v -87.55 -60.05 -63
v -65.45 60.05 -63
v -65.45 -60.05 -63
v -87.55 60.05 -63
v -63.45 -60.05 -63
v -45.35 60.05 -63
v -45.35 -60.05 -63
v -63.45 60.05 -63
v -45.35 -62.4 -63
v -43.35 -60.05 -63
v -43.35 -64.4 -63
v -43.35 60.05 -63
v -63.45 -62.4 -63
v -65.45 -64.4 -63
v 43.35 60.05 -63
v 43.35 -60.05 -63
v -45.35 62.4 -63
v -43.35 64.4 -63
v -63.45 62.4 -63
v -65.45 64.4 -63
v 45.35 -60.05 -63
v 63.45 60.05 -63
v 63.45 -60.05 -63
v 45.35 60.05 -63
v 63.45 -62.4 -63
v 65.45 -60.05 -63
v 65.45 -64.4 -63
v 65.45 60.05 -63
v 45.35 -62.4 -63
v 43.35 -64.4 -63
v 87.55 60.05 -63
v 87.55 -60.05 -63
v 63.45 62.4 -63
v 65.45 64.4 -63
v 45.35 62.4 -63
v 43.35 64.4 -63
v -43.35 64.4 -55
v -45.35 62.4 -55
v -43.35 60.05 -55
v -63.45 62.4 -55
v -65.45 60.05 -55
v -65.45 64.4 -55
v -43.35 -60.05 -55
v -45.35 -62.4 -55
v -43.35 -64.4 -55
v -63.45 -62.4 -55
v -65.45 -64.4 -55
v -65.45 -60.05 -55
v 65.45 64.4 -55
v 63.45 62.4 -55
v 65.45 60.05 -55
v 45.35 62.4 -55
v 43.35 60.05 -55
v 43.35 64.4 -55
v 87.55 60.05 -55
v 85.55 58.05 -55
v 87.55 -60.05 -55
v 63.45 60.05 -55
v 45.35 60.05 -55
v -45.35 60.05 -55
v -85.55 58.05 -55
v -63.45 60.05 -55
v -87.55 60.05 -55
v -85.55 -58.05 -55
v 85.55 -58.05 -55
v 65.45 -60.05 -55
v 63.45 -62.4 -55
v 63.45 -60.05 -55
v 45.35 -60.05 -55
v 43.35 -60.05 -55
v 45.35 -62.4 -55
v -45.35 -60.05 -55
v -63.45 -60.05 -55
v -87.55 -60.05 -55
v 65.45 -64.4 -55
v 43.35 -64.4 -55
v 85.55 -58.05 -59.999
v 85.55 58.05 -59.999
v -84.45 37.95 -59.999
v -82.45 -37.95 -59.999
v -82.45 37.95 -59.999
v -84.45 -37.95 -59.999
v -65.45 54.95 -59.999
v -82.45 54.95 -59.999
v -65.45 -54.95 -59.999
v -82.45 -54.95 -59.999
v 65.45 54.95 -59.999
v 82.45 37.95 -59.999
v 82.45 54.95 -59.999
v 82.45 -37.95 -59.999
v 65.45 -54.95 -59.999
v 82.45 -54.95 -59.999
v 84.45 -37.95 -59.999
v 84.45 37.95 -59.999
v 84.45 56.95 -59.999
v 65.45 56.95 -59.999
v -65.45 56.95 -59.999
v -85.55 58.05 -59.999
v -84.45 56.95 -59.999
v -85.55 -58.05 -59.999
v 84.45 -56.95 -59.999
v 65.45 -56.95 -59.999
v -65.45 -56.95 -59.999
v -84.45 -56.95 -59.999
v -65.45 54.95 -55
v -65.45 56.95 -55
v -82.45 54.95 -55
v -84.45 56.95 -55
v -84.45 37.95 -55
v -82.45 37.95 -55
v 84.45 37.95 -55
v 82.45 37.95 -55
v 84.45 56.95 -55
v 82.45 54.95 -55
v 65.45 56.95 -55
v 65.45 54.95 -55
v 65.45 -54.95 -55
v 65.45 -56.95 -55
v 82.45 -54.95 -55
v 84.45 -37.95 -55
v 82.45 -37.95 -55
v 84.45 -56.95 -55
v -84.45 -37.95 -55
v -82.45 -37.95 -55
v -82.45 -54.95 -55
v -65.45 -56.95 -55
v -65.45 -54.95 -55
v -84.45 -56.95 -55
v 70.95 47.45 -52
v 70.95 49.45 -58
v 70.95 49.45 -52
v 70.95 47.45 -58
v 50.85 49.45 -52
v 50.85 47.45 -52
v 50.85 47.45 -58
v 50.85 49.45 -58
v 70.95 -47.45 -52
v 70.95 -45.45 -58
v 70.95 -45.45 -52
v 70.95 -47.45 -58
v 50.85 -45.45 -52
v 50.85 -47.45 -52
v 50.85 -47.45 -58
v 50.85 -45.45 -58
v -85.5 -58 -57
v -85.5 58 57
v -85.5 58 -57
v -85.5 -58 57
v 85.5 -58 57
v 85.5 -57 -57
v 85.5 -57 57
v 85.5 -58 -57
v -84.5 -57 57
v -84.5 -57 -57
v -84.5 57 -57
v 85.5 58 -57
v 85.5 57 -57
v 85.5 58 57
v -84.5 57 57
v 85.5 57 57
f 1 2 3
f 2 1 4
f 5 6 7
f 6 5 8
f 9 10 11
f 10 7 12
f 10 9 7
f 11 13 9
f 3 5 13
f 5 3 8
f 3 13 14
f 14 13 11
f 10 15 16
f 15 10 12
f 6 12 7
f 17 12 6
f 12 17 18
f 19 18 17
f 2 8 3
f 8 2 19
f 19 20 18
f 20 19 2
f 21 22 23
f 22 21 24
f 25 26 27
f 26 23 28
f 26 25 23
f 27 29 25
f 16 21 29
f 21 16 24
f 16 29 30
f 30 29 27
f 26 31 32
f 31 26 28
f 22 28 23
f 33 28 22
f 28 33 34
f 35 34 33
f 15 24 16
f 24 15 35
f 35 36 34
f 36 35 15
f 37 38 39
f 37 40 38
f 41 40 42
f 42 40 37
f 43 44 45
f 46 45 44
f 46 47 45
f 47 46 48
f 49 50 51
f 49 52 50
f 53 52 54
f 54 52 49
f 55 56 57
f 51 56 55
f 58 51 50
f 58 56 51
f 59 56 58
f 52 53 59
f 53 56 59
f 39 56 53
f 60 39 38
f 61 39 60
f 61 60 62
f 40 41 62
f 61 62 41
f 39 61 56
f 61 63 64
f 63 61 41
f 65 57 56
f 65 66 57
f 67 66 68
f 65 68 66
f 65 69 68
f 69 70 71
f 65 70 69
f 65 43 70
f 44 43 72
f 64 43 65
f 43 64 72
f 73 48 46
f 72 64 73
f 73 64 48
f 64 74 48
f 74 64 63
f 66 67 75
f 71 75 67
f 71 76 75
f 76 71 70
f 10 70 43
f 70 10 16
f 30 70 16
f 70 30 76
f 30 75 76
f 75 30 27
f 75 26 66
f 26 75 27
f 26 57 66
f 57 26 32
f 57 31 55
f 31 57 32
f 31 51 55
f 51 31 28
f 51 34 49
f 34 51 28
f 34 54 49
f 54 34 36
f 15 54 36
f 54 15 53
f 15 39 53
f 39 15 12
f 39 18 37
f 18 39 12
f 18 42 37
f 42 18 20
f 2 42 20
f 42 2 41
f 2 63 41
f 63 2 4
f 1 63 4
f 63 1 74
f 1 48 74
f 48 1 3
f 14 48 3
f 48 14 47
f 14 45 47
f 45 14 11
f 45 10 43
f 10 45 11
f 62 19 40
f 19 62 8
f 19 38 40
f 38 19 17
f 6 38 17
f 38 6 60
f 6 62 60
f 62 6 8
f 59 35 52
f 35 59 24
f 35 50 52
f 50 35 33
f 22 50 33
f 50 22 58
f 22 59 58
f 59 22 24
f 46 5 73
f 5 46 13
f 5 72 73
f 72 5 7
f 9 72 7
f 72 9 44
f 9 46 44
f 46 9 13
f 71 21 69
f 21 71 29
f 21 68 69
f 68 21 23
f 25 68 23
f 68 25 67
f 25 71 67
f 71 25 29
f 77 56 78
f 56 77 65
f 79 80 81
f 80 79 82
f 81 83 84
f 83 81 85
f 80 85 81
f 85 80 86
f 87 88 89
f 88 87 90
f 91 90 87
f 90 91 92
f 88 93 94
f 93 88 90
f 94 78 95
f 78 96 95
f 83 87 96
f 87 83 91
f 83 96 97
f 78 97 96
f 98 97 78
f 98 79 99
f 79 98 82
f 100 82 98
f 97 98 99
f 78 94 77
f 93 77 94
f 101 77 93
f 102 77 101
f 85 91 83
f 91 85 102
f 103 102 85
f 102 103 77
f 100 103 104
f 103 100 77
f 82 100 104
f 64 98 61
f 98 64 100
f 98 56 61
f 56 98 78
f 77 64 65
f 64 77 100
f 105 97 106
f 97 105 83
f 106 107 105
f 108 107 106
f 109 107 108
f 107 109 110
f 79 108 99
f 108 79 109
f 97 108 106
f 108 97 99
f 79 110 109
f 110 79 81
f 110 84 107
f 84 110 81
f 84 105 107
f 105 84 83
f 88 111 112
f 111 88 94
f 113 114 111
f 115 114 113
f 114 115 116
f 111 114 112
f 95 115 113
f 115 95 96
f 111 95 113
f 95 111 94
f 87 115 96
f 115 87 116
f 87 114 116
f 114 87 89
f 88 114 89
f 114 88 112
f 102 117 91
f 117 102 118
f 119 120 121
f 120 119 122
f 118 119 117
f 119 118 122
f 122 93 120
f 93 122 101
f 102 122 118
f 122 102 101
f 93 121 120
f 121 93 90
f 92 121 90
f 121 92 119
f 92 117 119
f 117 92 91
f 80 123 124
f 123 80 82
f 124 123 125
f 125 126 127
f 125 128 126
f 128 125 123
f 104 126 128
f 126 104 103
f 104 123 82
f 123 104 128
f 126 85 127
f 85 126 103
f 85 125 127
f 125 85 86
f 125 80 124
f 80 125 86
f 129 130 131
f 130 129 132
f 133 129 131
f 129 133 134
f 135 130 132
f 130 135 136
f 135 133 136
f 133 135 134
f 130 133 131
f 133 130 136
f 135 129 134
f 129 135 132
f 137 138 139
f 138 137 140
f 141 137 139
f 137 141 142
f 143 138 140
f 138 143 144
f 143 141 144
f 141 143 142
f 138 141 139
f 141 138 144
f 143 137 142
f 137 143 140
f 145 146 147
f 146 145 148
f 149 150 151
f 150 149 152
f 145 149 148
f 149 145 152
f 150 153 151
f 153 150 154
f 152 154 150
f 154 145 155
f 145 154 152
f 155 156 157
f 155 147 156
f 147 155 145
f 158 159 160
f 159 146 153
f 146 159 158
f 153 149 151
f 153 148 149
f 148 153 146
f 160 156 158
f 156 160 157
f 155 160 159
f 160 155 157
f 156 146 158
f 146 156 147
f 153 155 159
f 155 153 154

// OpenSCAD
// file: part_bottom.scad
// include <BOSL2/std.scad>

module part_bottom() {
    color("blue", 0.8)

        // 4. holders
        union() {}
            // 3. pocket
            difference() {
                linear_extrude(height=bottom_z, center=true)
                    union() {
                        // 1. create body
                        square([bottom_x, bottom_y], center=true);
                        // 2. add ears - module
                        union() {
                            translate([-ear_x_o, 0, 0]) bottom_ear();
                            translate([ear_x_o, 0, 0]) bottom_ear();
                        }
                    };
                translate([0, 0, bottom_t + 0.001]) cube(size=[bottom_x - bottom_t*2, bottom_y - bottom_t*2, bottom_po], center=true);
            }
            
            translate([-holder_x_o, holder_y_o, bottom_t / 2]) bottom_holder();
            translate([holder_x_o, holder_y_o, bottom_t / 2]) rotate([0, 0, -90]) bottom_holder();
            translate([holder_x_o, -holder_y_o, bottom_t / 2]) rotate([0, 0, 180]) bottom_holder();
            translate([-holder_x_o, -holder_y_o, bottom_t / 2]) rotate([0, 0, 90]) bottom_holder();

            translate([holder_x_o - ear_x - bottom_t, holder_y_o, bottom_t / 2]) cube([ear_x - bottom_t, bottom_t, bottom_po]);
            translate([holder_x_o - ear_x - bottom_t, -holder_y_o, bottom_t / 2]) cube([ear_x - bottom_t, bottom_t, bottom_po]);

                // front holder
                // 4 holders

                // bolts

                // lamp

}

module bottom_ear() {
    
    difference() {
        square(size=[ear_x, ear_y], center=true);
        square(size=[ear_x - bottom_t * 2, ear_y - bottom_t * 2], center=true);    
    }

}

module bottom_holder() {
    
    translate ([0, 0, 0]) difference() {
        cube(size=[holder_x, holder_x, bottom_po], center=true);
        translate([bottom_t, -bottom_t, 0]) cube(size=[holder_x, holder_x, bottom_po], center=true);
    }

}


module bottom_lamp() {
    // dif bolt 1
    // add bolt 2
    // dif lamp 1
    // dif lamp 2

}
// file: part_wall.scad
module part_left(args) {
    color("red", 0.2)
        rotate([90, 0, 0]) 
            cube([wall_x, wall_z, wall_t], center=true);
}

module part_right(args) {
    color("red", 0.2) 
        rotate([90, 0, 0]) 
            cube([wall_x, wall_z, wall_t], center=true);
}

module part_back(args) {
    color("red", 0.2) 
        rotate([0, 90, 0]) 
            cube([back_y_f, wall_z, wall_t], center=true);
}
// main file
include <part_wall.scad>
include <part_bottom.scad>
// include <part_top.scad>
// include <part_front.scad>
// include <part_parts.scad>

// x - width, f - fix
// z - height
// t - thickness
// tol - tolerance
// d - diameter
// y - deep
// o - offset
// po - pocket
// r - radius

tol_f = 0.05;

back_y_f = 114; 
wall_x = back_y_f / 114 * 171;
wall_z = back_y_f;
wall_t = back_y_f / 114 * 1;
back_x_o = (wall_x - wall_t) / 2 ;
left_y_o = (back_y_f - - wall_t) / 2;

leg_x = back_y_f / 114 * 18;
leg_t = leg_x / 8;

bottom_t = back_y_f / 114 * 2;
bottom_z = back_y_f / 114 * 8;
bottom_x = wall_x + tol_f * 2 + bottom_t * 2;
bottom_y = back_y_f + (bottom_t + wall_t + tol_f) * 2;
bottom_po = bottom_z - bottom_t;
bottom_z_o = wall_z / 2 + bottom_t;

ear_leg_po_y = leg_t + tol_f * 2;
ear_x = leg_x + tol_f * 2 + bottom_t * 2;
ear_x_o = bottom_x / 2 - ear_x - ear_x / 2;
ear_y = (ear_leg_po_y + bottom_t) * 2 + bottom_y;

wall_holder_o = wall_t + tol_f * 2;
holder_x = ear_x - bottom_t - wall_holder_o;
holder_x_o = bottom_x / 2 - holder_x / 2 - bottom_t - wall_holder_o;
holder_y_o = bottom_y / 2 - holder_x / 2 - bottom_t - wall_holder_o;

// leg_z = back_y_f / 114 * 180;
// leg_part_z = wall_z + bottom_t * 3;

// top_z = bottom_z - bottom_t;

// lamp_d_f = 76;
// lamp_d2_f =	85;
// lamp_arc_y_f = 24;
// lamp_door_o	= wall_x / 2;
// lamp_bolt_o_f = 2.5;
// lamp_bolt_o2_f = 62;
// lamp_bolt_d_f = 2;
// lamp_bolt_d2_f = 5.5;
// lamp_bolt_z_f = 1.5;


// tube_d = back_y_f / 114 * 40;
// tube_t = bottom_t / 2;
// tube_back_o	= back_y_f / 114 * 40;
// tube_z = back_y_f / 114 * 150;
// tube_x_o = bottom_x / 2 - tube_back_o;
// tube_z_o = bottom_z_o - bottom_t - tube_t;
// tube_internal_d = tube_d - tube_t * 2;
// tube_external_d = tube_internal_d + tube_d / 5;

// front_holes_f = 9;
// front_t = bottom_t / 2;
// front_hole_d = back_y_f / 114 * 8;
// front_hole_segment_y = back_y_f / front_holes_f;
// front_hole_z_o = back_y_f / 114 * 12;

// door_y_o = back_y_f / 114 * 15;
// door_z_o = back_y_f / 114 * 15;
// door_o = back_y_f / 114 * 0.5;
// door_z = wall_z / 114 * 70;

// hinge_y = back_y_f / 114 * 10;
// hinge_z = hinge_y / 10 * 4;
// hinge_d = hinge_y / 10 * 3.2;

// axle_d = hinge_y / 10 * 2.6;
// axle_y_o = door_y_o + door_o / 2;
// door_latch_r1 = axle_d / 2 + 1 + tol_f * 2;
// door_latch_r2 = axle_d / 2 + tol_f * 2;
// lock_y = hinge_d;
// lock_t = lock_y;
// lock_z = back_y_f / 114 * 10;
// lock_t1 = lock_t / 3 * 2;
// lock_t2 = lock_t - lock_t1;
// latch_y = lock_z / 10 * 20;
// latch_axle_o = latch_y / 4;
// latch_r1 = axle_d / 2 + 1;

module cassis() {

    translate([0, 0, - bottom_z_o])
        part_bottom();

    // part_bottom();
    // translate([0, 0, height_of_bottom]) part_top();
    
    translate([0, - left_y_o, 0])
        part_left();

    translate([0, left_y_o, 0])
        part_right();

    translate([-back_x_o, 0, 0])
        part_back();

    // translate([0, 0, height_of_bottom + height_of_sides]) part_front();
}

cassis();
